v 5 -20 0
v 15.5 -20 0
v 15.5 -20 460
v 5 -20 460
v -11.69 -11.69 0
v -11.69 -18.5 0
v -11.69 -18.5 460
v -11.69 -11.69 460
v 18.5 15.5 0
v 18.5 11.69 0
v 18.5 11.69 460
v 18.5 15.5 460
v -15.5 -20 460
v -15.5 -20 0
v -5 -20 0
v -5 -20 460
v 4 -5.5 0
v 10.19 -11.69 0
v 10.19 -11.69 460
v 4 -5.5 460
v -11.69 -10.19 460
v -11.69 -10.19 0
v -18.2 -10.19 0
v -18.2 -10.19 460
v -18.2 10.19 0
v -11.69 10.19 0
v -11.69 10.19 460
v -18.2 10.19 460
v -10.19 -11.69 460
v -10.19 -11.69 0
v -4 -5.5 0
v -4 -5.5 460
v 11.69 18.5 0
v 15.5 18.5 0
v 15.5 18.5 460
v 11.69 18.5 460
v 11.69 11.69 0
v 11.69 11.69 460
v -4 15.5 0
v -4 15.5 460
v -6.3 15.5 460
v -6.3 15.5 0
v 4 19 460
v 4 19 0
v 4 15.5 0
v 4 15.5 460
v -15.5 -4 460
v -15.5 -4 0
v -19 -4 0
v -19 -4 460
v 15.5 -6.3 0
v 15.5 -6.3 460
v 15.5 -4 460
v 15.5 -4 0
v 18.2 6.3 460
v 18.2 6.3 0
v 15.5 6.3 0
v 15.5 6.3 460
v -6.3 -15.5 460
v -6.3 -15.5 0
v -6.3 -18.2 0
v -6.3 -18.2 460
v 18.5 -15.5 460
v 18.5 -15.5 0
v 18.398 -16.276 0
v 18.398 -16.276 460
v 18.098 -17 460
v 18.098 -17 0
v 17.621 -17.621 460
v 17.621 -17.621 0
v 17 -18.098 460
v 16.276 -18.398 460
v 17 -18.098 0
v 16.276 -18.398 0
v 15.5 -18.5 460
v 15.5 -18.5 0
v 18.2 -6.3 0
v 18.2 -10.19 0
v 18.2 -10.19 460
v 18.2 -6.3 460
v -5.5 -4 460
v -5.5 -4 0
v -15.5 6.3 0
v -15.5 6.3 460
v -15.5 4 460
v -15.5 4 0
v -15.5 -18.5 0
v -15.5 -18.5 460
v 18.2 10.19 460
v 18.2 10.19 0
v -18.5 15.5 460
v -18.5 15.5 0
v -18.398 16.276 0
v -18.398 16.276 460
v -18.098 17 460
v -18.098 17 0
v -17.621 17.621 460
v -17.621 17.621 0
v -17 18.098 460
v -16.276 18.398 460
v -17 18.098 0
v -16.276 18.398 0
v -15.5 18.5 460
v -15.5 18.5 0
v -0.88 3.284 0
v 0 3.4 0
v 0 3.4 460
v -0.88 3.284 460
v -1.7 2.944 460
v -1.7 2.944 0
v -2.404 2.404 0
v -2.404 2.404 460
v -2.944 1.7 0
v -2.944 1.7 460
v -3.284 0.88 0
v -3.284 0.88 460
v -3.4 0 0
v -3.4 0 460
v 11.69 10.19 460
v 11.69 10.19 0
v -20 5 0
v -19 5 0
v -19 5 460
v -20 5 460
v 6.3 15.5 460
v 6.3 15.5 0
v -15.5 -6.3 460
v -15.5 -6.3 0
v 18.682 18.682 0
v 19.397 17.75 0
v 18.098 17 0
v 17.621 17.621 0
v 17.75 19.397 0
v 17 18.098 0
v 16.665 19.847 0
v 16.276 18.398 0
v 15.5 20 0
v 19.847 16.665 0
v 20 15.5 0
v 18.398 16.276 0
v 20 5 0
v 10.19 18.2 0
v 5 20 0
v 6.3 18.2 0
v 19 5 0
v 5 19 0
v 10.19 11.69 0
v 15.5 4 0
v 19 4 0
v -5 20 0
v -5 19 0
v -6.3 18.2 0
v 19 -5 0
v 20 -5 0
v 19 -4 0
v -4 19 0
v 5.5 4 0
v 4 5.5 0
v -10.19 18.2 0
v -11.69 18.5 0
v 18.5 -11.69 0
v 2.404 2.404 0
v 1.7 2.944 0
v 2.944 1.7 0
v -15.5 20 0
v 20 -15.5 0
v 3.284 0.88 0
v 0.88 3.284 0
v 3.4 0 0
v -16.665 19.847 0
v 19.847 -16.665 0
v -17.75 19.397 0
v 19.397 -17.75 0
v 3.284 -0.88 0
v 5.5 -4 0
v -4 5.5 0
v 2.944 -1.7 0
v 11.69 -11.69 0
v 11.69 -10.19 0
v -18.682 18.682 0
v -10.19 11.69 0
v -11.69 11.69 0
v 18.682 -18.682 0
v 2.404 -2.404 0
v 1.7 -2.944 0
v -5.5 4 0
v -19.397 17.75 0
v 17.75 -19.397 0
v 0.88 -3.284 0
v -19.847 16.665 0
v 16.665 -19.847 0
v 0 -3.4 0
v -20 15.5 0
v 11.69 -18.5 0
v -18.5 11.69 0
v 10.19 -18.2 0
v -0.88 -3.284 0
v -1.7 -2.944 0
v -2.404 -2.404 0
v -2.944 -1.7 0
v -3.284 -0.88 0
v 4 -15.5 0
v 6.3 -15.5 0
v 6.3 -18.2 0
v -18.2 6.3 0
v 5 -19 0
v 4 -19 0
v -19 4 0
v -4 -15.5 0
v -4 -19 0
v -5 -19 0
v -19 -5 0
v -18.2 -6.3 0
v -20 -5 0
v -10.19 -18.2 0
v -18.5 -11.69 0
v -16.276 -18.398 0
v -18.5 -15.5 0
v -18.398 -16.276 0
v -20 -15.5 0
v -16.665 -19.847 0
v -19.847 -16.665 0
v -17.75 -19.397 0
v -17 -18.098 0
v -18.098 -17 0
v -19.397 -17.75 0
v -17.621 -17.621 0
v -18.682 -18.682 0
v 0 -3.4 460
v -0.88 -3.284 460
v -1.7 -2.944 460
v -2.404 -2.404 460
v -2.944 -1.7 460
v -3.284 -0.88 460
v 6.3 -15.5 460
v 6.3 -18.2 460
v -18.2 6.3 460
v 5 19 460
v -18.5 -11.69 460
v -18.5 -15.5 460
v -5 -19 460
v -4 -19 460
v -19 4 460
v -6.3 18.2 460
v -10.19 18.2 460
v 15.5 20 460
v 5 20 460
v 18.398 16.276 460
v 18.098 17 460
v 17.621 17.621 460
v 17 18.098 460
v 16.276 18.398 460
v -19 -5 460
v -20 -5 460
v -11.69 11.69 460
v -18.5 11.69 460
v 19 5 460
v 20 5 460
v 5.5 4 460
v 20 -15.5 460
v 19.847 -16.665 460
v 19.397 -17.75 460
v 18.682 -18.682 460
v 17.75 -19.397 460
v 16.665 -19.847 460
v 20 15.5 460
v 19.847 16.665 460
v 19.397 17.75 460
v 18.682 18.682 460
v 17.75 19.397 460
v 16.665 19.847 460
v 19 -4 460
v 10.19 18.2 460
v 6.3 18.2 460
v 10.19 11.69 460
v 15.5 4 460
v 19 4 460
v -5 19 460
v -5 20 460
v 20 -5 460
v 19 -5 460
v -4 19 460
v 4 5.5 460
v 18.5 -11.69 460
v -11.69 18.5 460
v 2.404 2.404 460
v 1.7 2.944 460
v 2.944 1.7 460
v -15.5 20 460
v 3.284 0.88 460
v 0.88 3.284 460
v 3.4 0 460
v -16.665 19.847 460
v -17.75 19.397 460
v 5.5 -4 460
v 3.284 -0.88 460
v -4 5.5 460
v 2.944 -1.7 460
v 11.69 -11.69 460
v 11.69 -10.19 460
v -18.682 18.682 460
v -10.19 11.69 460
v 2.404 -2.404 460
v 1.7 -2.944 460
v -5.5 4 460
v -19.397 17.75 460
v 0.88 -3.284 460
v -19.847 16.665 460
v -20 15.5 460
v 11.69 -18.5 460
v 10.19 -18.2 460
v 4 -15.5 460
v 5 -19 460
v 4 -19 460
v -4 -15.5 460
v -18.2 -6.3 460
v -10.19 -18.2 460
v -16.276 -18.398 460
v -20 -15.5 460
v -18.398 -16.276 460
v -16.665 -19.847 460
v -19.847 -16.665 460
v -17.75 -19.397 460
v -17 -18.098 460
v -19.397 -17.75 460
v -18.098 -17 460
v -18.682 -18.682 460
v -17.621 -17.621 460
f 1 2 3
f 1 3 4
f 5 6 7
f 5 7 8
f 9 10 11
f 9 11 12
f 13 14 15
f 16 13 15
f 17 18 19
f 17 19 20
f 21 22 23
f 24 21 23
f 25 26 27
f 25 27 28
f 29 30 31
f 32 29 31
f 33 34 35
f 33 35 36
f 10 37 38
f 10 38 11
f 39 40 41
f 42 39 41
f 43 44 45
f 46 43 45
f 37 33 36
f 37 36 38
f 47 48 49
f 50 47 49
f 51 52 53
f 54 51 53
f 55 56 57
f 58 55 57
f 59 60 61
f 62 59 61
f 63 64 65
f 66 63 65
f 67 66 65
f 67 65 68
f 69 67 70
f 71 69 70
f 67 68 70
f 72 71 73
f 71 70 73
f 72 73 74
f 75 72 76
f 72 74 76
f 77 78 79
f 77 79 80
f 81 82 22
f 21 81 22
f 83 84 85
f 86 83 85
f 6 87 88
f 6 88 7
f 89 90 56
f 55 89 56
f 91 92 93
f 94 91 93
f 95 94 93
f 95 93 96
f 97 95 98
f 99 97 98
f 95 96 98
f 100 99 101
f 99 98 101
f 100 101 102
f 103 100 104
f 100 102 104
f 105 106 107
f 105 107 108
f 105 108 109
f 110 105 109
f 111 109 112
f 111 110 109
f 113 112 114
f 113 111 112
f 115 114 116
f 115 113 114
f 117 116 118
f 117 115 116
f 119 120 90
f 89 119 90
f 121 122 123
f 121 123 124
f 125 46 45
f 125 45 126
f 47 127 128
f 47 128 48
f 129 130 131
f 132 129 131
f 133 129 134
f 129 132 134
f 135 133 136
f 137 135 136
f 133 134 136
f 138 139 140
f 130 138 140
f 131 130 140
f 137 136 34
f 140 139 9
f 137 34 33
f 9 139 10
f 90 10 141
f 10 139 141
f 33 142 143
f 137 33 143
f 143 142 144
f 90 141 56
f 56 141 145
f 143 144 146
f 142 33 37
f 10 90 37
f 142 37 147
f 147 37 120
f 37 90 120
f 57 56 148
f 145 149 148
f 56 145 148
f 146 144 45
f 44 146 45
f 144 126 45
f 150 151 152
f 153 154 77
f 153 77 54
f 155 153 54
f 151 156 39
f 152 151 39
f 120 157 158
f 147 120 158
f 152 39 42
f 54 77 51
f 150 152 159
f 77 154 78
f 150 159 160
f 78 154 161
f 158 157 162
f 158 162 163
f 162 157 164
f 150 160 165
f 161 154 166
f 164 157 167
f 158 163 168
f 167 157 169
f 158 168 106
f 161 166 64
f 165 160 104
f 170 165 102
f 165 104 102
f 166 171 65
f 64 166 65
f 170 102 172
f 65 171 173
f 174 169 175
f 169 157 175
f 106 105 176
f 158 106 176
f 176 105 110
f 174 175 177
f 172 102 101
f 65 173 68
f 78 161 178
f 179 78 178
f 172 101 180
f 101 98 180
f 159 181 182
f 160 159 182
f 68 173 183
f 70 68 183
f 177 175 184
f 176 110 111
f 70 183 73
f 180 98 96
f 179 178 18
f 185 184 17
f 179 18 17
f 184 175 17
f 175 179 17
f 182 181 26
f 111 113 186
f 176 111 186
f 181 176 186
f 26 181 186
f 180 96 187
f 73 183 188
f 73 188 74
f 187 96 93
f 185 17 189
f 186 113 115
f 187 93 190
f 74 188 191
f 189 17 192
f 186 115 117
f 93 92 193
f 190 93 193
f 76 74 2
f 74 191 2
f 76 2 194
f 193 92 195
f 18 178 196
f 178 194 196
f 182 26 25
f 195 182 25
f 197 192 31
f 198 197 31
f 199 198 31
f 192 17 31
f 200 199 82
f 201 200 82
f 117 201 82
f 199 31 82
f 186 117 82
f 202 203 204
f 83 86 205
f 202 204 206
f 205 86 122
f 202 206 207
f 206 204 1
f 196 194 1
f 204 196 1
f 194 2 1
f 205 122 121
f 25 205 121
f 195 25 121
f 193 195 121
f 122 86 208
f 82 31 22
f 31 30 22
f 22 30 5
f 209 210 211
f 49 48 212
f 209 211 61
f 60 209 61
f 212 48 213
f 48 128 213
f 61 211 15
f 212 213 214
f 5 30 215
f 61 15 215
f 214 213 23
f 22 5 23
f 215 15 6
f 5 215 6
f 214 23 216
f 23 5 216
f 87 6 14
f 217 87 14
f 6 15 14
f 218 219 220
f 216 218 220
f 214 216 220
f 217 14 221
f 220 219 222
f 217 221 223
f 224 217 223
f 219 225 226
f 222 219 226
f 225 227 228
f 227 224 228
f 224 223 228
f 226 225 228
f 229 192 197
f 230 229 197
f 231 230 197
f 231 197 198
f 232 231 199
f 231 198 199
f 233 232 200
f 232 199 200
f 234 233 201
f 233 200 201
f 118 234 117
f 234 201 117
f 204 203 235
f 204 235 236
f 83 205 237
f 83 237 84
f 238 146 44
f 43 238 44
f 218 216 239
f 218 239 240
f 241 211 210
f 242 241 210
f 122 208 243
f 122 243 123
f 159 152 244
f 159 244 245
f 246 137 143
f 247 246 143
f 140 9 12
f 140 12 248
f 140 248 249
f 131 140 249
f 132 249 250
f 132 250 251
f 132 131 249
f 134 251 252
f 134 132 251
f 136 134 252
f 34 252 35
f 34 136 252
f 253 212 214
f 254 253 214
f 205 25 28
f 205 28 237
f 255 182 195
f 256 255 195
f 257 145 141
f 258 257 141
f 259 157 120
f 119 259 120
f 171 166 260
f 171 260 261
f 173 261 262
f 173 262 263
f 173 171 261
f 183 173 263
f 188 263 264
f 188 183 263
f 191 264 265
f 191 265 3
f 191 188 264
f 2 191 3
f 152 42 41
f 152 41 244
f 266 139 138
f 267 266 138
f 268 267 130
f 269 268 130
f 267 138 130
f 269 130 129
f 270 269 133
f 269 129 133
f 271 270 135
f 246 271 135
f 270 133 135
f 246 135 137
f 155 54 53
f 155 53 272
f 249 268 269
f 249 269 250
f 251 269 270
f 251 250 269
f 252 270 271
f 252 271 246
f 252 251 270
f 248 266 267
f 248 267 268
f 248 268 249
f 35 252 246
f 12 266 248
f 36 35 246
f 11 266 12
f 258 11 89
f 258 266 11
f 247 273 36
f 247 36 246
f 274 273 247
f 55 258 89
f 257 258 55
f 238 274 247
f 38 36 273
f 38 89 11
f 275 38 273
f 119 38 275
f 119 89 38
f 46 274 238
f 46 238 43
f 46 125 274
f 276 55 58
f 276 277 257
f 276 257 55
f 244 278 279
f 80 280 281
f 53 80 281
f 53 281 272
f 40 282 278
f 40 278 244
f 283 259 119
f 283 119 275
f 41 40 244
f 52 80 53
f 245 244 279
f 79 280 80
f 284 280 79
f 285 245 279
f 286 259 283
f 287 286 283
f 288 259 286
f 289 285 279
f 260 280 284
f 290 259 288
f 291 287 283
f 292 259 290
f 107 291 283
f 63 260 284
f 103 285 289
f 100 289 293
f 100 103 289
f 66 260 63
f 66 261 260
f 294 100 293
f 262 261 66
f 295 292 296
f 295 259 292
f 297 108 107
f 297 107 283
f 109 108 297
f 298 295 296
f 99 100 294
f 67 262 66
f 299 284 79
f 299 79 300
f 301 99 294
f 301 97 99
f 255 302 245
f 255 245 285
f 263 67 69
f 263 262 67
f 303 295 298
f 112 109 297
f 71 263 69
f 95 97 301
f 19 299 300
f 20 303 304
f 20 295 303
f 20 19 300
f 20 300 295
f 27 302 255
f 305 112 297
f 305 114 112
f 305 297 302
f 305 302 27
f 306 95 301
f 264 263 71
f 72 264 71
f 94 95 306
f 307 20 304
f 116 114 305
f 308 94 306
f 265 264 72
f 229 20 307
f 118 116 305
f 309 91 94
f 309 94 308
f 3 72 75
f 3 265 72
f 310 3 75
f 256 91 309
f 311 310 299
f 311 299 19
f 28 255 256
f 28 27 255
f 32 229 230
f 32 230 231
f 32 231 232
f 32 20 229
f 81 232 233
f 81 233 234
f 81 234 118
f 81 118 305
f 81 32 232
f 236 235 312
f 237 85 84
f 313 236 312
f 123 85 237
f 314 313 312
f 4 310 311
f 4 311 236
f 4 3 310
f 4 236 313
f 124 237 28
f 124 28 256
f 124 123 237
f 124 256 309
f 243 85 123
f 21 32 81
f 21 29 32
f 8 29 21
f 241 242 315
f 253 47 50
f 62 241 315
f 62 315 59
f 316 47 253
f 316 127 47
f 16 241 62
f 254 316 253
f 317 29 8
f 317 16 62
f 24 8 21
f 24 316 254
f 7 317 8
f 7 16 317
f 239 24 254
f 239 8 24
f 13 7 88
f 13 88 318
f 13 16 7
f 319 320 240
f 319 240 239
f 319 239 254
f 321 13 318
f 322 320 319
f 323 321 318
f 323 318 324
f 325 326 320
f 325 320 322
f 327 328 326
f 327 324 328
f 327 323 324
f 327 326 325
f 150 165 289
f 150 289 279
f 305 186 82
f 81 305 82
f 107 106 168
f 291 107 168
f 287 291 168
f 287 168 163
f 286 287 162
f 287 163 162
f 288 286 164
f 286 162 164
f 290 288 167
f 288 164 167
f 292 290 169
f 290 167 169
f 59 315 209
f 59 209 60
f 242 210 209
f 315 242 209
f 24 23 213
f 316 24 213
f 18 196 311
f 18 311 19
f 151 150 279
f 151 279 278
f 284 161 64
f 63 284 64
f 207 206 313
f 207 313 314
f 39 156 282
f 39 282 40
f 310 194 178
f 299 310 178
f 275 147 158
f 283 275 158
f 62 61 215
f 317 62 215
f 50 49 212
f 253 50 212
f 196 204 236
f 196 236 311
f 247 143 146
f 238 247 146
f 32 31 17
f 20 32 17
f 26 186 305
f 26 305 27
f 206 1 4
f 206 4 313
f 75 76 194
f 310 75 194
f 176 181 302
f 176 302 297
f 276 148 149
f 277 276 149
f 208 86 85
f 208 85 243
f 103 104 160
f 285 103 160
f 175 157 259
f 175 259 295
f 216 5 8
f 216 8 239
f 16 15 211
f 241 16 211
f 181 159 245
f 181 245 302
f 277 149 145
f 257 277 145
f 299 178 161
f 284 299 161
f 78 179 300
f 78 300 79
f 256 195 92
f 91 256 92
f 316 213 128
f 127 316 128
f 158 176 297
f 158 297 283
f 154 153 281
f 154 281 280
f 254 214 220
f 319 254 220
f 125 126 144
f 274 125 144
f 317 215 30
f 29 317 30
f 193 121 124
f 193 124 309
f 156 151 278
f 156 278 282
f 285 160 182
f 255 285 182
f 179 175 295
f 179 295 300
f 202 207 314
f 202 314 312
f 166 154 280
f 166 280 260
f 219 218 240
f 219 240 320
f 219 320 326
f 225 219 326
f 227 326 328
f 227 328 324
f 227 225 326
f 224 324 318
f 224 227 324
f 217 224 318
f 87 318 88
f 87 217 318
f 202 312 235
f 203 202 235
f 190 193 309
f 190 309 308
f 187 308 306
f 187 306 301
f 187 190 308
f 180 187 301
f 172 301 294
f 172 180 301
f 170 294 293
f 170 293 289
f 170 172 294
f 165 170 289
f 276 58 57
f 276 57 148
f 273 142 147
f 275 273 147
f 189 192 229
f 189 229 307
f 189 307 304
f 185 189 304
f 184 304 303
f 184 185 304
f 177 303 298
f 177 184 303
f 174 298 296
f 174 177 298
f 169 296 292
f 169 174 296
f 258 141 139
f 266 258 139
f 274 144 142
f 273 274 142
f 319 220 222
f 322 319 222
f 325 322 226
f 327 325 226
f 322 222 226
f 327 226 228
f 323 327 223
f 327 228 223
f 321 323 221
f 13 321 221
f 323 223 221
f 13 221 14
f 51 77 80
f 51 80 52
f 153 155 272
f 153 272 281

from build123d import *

# Parameters (mm, degrees)
BOSS_EXTRUDE1_DEPTH  = 460
MIRROR3_COPY_1_DEPTH = 460
MIRROR3_COPY_2_DEPTH = 460


with BuildPart() as part:
    # Sketch1 → Boss-Extrude1 (new body)
    with BuildSketch(Plane.XY):
        with BuildLine():
            Line((3.4, 0), (5.5, 0))
            Line((5.5, 0), (5.5, 4))
            Line((5.5, 4), (11.69, 10.19))
            Line((11.69, 10.19), (18.2, 10.19))
            Line((18.2, 10.19), (18.2, 6.3))
            Line((18.2, 6.3), (15.5, 6.3))
            Line((15.5, 6.3), (15.5, 4))
            Line((15.5, 4), (19, 4))
            Line((19, 4), (19, 5))
            Line((19, 5), (20, 5))
            Line((20, 5), (20, 15.5))
            ThreePointArc((20, 15.5), (18.681980515, 18.681980515), (15.5, 20))
            Line((15.5, 20), (5, 20))
            Line((5, 20), (5, 19))
            Line((5, 19), (4, 19))
            Line((4, 19), (4, 15.5))
            Line((4, 15.5), (6.3, 15.5))
            Line((6.3, 15.5), (6.3, 18.2))
            Line((6.3, 18.2), (10.19, 18.2))
            Line((10.19, 18.2), (10.19, 11.69))
            Line((10.19, 11.69), (4, 5.5))
            Line((4, 5.5), (0, 5.5))
            Line((0, 5.5), (0, 3.4))
            ThreePointArc((0, 3.4), (2.404163056, 2.404163056), (3.4, 0))
        make_face()
        with BuildLine():
            Line((18.5, 11.69), (18.5, 15.5))
            ThreePointArc((18.5, 15.5), (17.621320344, 17.621320344), (15.5, 18.5))
            Line((15.5, 18.5), (11.69, 18.5))
            Line((11.69, 18.5), (11.69, 11.69))
            Line((11.69, 11.69), (18.5, 11.69))
        make_face(mode=Mode.SUBTRACT)
    boss_extrude1 = extrude(amount=BOSS_EXTRUDE1_DEPTH)

    # Mirror1: Boss-Extrude1 across plane
    add(boss_extrude1.mirror(Plane.ZX))

    # Mirror2: Boss-Extrude1 across plane
    add(boss_extrude1.mirror(Plane(origin=(0, 0, 0), x_dir=(0, 0, 1), z_dir=(1, 0, 0))))

    # Mirror3 copy 1 sketch → Mirror3 copy 1 (add)
    with BuildSketch(Plane(origin=(0, 0, 0), x_dir=(-1, 0, 0), z_dir=(0, 0, 1))):
        with BuildLine():
            Line((3.4, 0), (5.5, 0))
            Line((5.5, 0), (5.5, 4))
            Line((5.5, 4), (11.69, 10.19))
            Line((11.69, 10.19), (18.2, 10.19))
            Line((18.2, 10.19), (18.2, 6.3))
            Line((18.2, 6.3), (15.5, 6.3))
            Line((15.5, 6.3), (15.5, 4))
            Line((15.5, 4), (19, 4))
            Line((19, 4), (19, 5))
            Line((19, 5), (20, 5))
            Line((20, 5), (20, 15.5))
            ThreePointArc((20, 15.5), (18.681980515, 18.681980515), (15.5, 20))
            Line((15.5, 20), (5, 20))
            Line((5, 20), (5, 19))
            Line((5, 19), (4, 19))
            Line((4, 19), (4, 15.5))
            Line((4, 15.5), (6.3, 15.5))
            Line((6.3, 15.5), (6.3, 18.2))
            Line((6.3, 18.2), (10.19, 18.2))
            Line((10.19, 18.2), (10.19, 11.69))
            Line((10.19, 11.69), (4, 5.5))
            Line((4, 5.5), (0, 5.5))
            Line((0, 5.5), (0, 3.4))
            ThreePointArc((0, 3.4), (2.404163056, 2.404163056), (3.4, 0))
        make_face()
        with BuildLine():
            Line((18.5, 11.69), (18.5, 15.5))
            ThreePointArc((18.5, 15.5), (17.621320344, 17.621320344), (15.5, 18.5))
            Line((15.5, 18.5), (11.69, 18.5))
            Line((11.69, 18.5), (11.69, 11.69))
            Line((11.69, 11.69), (18.5, 11.69))
        make_face(mode=Mode.SUBTRACT)
    extrude(amount=MIRROR3_COPY_1_DEPTH)

    # Mirror3 copy 2 sketch → Mirror3 copy 2 (add)
    with BuildSketch(Plane.XY):
        with BuildLine():
            Line((3.4, 0), (5.5, 0))
            Line((5.5, 0), (5.5, -4))
            Line((5.5, -4), (11.69, -10.19))
            Line((11.69, -10.19), (18.2, -10.19))
            Line((18.2, -10.19), (18.2, -6.3))
            Line((18.2, -6.3), (15.5, -6.3))
            Line((15.5, -6.3), (15.5, -4))
            Line((15.5, -4), (19, -4))
            Line((19, -4), (19, -5))
            Line((19, -5), (20, -5))
            Line((20, -5), (20, -15.5))
            ThreePointArc((20, -15.5), (18.681980515, -18.681980515), (15.5, -20))
            Line((15.5, -20), (5, -20))
            Line((5, -20), (5, -19))
            Line((5, -19), (4, -19))
            Line((4, -19), (4, -15.5))
            Line((4, -15.5), (6.3, -15.5))
            Line((6.3, -15.5), (6.3, -18.2))
            Line((6.3, -18.2), (10.19, -18.2))
            Line((10.19, -18.2), (10.19, -11.69))
            Line((10.19, -11.69), (4, -5.5))
            Line((4, -5.5), (0, -5.5))
            Line((0, -5.5), (0, -3.4))
            ThreePointArc((0, -3.4), (2.404163056, -2.404163056), (3.4, 0))
        make_face()
        with BuildLine():
            Line((18.5, -11.69), (18.5, -15.5))
            ThreePointArc((18.5, -15.5), (17.621320344, -17.621320344), (15.5, -18.5))
            Line((15.5, -18.5), (11.69, -18.5))
            Line((11.69, -18.5), (11.69, -11.69))
            Line((11.69, -11.69), (18.5, -11.69))
        make_face(mode=Mode.SUBTRACT)
    extrude(amount=MIRROR3_COPY_2_DEPTH)


solid = part.part
